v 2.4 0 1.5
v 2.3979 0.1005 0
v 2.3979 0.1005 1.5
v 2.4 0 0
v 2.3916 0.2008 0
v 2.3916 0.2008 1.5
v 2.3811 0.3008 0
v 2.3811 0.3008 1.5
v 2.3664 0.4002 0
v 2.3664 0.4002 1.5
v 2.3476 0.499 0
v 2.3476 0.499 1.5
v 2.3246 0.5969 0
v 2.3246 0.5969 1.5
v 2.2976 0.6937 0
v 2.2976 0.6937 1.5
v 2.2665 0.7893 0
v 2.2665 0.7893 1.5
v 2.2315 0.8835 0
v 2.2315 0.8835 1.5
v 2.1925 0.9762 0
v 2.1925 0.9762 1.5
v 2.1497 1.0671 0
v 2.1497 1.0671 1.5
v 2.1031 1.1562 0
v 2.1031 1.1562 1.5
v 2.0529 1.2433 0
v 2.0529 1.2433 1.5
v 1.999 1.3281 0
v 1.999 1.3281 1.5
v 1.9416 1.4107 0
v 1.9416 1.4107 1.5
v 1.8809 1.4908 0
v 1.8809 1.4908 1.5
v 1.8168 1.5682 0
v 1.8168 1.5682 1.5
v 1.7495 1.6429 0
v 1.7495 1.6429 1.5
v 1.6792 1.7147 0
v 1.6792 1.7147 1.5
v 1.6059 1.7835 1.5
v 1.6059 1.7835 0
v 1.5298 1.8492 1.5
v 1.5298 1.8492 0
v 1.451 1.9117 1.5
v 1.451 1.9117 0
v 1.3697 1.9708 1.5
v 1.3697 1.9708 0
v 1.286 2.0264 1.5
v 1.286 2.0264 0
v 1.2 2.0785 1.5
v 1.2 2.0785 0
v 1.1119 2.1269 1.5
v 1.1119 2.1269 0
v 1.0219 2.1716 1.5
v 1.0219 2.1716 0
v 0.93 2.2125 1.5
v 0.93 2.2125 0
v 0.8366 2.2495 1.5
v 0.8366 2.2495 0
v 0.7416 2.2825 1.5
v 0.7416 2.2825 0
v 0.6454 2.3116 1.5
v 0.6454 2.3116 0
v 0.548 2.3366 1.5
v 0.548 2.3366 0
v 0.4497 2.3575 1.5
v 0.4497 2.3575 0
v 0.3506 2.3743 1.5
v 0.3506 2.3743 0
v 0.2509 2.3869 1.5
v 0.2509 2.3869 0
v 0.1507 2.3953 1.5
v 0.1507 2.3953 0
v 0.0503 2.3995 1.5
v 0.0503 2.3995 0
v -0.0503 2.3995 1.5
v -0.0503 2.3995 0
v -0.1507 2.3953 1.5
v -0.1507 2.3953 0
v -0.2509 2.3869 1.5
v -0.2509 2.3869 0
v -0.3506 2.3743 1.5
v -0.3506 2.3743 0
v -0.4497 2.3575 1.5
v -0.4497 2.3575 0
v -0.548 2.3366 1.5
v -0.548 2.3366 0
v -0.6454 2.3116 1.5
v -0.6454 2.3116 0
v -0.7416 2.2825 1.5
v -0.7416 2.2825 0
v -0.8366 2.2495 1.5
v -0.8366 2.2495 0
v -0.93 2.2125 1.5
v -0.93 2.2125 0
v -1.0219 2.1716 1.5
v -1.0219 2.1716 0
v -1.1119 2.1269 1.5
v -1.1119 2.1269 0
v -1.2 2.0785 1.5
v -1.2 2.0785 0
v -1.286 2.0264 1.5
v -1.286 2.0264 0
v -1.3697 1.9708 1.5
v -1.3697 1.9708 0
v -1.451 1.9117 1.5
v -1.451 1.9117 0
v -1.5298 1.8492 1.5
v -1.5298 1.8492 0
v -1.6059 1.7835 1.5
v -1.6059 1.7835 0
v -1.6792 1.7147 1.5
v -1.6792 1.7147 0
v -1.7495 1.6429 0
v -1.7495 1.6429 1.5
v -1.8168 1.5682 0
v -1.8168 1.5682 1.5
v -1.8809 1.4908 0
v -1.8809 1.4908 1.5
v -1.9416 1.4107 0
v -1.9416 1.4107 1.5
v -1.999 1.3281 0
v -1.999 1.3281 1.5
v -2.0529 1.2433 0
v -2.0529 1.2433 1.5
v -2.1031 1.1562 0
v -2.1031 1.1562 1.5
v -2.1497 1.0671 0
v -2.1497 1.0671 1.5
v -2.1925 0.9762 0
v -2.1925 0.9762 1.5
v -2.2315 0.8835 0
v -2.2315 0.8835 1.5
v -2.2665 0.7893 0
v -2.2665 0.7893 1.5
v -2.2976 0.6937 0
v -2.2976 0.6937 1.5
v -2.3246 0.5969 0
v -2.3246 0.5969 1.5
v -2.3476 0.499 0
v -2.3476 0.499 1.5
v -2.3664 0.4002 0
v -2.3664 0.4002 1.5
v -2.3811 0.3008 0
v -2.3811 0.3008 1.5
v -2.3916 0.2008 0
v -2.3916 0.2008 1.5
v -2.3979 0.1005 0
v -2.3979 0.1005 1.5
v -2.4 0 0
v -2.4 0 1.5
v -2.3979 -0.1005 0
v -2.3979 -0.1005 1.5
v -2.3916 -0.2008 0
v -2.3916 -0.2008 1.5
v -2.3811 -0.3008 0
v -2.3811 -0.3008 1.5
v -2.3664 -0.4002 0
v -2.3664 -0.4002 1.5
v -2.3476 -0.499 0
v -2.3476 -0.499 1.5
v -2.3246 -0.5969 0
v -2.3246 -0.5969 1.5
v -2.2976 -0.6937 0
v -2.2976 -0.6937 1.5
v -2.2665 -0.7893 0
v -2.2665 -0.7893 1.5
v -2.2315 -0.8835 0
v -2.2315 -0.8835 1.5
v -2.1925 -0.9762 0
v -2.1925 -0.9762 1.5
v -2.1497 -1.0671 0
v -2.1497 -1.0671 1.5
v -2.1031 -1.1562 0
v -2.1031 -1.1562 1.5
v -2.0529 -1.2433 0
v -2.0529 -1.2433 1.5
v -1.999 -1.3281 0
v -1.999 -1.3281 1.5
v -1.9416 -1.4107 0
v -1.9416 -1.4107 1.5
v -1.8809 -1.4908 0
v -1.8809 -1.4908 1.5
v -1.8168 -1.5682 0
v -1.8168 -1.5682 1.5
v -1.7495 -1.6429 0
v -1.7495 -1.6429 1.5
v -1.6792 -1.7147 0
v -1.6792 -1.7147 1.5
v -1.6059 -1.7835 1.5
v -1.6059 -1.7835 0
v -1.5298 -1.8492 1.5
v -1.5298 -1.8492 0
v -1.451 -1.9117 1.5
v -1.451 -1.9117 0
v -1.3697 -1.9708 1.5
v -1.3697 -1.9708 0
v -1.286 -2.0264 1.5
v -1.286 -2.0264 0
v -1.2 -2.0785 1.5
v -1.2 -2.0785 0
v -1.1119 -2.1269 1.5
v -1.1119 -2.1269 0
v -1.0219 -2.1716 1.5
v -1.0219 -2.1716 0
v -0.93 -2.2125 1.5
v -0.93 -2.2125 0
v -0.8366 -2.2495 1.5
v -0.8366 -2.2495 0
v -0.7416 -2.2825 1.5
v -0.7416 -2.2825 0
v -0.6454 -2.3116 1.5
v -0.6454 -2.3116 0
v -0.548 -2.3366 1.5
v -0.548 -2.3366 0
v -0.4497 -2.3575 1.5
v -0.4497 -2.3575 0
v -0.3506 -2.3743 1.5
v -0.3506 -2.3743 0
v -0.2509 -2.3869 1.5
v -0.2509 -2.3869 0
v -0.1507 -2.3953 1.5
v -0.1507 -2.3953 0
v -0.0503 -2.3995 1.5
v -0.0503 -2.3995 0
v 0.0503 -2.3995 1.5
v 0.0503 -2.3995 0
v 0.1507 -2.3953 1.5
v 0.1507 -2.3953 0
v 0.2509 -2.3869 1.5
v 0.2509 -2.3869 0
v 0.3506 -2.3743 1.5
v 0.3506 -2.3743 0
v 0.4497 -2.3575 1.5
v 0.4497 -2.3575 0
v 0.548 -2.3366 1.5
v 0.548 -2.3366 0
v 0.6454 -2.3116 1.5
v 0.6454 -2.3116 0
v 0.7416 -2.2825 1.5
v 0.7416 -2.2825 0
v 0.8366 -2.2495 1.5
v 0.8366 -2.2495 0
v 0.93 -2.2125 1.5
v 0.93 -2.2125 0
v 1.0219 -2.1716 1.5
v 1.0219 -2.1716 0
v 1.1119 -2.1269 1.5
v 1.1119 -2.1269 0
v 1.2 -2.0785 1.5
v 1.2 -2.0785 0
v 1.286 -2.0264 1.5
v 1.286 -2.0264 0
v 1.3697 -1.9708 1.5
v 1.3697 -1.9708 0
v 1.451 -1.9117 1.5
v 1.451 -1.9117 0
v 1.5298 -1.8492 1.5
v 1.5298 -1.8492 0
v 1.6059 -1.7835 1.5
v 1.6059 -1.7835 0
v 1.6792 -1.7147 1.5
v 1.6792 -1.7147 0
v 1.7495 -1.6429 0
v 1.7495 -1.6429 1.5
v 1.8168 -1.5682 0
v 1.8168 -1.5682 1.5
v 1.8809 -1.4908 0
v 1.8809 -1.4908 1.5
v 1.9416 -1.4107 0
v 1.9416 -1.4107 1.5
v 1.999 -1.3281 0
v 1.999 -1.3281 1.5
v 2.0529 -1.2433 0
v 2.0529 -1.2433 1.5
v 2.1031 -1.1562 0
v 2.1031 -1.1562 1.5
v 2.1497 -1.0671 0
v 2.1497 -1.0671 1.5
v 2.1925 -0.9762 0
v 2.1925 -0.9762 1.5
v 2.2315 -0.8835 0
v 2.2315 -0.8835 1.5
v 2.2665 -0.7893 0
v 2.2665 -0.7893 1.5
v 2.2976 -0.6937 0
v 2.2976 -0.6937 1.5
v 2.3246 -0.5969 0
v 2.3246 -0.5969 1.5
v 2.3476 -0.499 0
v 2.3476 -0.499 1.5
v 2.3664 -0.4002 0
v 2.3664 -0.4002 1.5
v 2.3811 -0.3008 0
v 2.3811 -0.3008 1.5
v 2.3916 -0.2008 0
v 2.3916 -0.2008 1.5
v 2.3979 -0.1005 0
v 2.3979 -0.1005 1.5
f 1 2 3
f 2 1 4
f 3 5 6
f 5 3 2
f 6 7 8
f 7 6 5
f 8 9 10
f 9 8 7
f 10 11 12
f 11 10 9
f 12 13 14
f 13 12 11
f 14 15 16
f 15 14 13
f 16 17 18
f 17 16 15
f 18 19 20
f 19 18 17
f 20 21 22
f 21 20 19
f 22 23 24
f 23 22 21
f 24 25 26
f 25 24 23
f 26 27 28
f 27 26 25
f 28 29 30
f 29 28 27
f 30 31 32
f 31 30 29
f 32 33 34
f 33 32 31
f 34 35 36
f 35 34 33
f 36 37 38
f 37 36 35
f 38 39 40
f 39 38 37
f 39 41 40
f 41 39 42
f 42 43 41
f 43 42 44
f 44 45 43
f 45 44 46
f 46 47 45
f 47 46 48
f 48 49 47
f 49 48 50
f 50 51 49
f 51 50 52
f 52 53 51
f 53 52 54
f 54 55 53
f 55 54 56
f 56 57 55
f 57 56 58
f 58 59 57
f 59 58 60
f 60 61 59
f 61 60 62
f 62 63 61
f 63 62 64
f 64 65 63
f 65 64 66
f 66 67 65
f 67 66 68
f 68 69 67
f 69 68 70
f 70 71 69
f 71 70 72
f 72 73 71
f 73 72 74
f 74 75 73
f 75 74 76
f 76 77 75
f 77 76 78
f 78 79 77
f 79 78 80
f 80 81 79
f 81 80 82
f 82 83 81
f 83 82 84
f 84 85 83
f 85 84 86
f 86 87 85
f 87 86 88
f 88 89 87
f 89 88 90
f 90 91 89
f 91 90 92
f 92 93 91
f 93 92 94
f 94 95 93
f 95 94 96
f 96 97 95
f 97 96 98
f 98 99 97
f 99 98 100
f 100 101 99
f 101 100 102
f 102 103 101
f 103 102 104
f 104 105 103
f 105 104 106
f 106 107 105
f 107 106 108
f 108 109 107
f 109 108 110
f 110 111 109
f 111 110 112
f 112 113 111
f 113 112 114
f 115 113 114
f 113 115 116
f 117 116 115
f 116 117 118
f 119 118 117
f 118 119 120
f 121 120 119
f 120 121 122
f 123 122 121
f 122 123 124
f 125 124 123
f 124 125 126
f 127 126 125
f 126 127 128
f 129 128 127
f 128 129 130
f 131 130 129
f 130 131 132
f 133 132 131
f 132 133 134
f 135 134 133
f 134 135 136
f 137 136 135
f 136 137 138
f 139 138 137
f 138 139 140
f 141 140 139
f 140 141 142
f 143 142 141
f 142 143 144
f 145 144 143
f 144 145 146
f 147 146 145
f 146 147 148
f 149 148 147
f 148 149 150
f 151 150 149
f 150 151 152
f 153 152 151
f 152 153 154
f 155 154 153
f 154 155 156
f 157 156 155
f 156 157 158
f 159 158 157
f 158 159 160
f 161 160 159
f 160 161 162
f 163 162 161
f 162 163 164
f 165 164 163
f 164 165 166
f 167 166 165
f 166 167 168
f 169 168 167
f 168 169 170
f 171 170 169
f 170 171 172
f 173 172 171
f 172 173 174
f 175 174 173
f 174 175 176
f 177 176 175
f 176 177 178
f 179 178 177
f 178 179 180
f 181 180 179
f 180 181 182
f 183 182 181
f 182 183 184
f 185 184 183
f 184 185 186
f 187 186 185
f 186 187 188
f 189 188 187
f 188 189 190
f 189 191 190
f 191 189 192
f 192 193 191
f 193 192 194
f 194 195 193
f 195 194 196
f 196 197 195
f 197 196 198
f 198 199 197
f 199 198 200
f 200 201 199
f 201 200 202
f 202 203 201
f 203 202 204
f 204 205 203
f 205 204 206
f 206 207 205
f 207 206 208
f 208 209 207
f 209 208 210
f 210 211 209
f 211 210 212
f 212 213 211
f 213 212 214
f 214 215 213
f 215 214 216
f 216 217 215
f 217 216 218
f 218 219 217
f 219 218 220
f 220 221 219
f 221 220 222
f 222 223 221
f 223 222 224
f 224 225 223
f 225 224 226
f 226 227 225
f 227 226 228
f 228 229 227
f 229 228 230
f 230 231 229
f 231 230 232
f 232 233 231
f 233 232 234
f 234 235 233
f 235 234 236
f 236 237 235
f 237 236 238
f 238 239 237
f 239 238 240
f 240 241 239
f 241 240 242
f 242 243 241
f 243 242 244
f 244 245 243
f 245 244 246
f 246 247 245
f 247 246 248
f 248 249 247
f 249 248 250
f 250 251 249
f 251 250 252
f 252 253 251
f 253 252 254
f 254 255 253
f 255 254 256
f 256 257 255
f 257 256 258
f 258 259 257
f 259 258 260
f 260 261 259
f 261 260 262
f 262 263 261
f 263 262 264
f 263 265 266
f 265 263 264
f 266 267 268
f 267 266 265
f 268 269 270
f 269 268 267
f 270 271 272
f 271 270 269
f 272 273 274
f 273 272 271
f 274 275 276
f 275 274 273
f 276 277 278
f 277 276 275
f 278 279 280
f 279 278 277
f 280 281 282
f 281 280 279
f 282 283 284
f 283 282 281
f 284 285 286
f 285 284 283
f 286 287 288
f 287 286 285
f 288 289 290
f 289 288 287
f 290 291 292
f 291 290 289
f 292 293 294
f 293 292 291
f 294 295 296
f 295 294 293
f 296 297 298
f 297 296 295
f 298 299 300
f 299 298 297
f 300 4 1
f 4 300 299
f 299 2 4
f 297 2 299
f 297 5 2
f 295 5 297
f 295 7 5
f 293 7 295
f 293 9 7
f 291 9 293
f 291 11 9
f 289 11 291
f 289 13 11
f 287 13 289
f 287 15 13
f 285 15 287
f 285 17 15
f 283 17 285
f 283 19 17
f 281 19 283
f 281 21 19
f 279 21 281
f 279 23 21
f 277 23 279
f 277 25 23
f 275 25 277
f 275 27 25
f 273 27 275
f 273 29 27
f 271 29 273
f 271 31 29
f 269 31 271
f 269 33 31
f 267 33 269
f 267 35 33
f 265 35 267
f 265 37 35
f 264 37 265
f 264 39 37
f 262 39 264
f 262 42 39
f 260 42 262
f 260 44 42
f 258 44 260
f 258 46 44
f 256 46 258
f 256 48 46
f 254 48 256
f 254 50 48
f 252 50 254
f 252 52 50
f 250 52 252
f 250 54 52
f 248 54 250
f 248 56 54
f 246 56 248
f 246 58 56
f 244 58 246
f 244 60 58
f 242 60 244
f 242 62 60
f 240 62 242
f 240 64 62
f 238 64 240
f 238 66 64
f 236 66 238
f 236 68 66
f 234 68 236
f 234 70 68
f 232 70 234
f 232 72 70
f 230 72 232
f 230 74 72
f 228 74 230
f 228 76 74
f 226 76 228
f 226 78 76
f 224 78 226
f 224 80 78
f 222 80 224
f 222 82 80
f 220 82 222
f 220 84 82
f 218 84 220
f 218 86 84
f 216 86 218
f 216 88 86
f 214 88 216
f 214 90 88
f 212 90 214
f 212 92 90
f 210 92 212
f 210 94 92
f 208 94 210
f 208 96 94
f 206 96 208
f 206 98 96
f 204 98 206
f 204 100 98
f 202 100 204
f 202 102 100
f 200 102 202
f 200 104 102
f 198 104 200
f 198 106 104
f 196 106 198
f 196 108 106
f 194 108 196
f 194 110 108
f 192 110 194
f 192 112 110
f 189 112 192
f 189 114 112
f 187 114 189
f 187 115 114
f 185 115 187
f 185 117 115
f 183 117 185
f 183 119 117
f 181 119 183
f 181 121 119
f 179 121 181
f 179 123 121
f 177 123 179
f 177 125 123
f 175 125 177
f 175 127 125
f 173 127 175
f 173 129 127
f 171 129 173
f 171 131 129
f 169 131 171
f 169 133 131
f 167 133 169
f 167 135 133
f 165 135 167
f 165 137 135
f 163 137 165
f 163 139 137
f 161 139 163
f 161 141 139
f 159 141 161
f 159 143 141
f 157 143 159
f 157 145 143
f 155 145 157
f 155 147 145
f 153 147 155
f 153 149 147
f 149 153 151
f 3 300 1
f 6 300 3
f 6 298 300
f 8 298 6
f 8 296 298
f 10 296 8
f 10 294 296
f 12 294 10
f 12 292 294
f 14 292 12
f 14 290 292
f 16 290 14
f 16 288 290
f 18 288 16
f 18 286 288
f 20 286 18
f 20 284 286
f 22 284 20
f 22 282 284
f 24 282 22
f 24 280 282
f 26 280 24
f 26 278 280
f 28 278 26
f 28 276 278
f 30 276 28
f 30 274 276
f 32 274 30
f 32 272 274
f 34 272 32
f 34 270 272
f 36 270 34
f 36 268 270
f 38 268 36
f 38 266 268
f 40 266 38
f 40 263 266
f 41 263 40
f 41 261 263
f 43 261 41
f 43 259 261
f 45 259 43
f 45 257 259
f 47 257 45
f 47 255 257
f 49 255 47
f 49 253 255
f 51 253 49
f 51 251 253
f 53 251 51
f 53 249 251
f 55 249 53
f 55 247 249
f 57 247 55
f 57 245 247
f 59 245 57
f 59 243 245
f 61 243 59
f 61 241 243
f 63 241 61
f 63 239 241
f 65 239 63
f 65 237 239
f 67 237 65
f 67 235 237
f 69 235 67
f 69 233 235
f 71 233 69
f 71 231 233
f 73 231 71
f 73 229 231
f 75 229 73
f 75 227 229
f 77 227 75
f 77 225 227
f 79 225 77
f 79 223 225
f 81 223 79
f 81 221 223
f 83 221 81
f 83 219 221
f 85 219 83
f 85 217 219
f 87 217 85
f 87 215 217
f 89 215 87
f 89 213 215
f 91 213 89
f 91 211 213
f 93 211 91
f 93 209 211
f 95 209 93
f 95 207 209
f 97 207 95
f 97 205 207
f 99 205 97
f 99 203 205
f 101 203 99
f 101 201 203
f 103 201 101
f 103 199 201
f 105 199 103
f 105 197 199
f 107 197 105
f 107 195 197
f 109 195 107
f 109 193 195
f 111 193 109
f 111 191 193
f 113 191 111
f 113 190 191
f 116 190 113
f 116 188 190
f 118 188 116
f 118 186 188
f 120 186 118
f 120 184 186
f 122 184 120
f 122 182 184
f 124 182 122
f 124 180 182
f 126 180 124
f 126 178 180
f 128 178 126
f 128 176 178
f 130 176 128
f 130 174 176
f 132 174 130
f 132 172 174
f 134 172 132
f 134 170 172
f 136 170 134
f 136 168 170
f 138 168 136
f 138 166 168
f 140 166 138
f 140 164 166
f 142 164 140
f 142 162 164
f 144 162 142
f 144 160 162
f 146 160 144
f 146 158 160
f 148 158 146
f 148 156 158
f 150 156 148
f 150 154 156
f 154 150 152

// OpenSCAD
module convex(){
	cylinder($fn=150, r=1.6*1.5, h=1.5);
}

convex();
